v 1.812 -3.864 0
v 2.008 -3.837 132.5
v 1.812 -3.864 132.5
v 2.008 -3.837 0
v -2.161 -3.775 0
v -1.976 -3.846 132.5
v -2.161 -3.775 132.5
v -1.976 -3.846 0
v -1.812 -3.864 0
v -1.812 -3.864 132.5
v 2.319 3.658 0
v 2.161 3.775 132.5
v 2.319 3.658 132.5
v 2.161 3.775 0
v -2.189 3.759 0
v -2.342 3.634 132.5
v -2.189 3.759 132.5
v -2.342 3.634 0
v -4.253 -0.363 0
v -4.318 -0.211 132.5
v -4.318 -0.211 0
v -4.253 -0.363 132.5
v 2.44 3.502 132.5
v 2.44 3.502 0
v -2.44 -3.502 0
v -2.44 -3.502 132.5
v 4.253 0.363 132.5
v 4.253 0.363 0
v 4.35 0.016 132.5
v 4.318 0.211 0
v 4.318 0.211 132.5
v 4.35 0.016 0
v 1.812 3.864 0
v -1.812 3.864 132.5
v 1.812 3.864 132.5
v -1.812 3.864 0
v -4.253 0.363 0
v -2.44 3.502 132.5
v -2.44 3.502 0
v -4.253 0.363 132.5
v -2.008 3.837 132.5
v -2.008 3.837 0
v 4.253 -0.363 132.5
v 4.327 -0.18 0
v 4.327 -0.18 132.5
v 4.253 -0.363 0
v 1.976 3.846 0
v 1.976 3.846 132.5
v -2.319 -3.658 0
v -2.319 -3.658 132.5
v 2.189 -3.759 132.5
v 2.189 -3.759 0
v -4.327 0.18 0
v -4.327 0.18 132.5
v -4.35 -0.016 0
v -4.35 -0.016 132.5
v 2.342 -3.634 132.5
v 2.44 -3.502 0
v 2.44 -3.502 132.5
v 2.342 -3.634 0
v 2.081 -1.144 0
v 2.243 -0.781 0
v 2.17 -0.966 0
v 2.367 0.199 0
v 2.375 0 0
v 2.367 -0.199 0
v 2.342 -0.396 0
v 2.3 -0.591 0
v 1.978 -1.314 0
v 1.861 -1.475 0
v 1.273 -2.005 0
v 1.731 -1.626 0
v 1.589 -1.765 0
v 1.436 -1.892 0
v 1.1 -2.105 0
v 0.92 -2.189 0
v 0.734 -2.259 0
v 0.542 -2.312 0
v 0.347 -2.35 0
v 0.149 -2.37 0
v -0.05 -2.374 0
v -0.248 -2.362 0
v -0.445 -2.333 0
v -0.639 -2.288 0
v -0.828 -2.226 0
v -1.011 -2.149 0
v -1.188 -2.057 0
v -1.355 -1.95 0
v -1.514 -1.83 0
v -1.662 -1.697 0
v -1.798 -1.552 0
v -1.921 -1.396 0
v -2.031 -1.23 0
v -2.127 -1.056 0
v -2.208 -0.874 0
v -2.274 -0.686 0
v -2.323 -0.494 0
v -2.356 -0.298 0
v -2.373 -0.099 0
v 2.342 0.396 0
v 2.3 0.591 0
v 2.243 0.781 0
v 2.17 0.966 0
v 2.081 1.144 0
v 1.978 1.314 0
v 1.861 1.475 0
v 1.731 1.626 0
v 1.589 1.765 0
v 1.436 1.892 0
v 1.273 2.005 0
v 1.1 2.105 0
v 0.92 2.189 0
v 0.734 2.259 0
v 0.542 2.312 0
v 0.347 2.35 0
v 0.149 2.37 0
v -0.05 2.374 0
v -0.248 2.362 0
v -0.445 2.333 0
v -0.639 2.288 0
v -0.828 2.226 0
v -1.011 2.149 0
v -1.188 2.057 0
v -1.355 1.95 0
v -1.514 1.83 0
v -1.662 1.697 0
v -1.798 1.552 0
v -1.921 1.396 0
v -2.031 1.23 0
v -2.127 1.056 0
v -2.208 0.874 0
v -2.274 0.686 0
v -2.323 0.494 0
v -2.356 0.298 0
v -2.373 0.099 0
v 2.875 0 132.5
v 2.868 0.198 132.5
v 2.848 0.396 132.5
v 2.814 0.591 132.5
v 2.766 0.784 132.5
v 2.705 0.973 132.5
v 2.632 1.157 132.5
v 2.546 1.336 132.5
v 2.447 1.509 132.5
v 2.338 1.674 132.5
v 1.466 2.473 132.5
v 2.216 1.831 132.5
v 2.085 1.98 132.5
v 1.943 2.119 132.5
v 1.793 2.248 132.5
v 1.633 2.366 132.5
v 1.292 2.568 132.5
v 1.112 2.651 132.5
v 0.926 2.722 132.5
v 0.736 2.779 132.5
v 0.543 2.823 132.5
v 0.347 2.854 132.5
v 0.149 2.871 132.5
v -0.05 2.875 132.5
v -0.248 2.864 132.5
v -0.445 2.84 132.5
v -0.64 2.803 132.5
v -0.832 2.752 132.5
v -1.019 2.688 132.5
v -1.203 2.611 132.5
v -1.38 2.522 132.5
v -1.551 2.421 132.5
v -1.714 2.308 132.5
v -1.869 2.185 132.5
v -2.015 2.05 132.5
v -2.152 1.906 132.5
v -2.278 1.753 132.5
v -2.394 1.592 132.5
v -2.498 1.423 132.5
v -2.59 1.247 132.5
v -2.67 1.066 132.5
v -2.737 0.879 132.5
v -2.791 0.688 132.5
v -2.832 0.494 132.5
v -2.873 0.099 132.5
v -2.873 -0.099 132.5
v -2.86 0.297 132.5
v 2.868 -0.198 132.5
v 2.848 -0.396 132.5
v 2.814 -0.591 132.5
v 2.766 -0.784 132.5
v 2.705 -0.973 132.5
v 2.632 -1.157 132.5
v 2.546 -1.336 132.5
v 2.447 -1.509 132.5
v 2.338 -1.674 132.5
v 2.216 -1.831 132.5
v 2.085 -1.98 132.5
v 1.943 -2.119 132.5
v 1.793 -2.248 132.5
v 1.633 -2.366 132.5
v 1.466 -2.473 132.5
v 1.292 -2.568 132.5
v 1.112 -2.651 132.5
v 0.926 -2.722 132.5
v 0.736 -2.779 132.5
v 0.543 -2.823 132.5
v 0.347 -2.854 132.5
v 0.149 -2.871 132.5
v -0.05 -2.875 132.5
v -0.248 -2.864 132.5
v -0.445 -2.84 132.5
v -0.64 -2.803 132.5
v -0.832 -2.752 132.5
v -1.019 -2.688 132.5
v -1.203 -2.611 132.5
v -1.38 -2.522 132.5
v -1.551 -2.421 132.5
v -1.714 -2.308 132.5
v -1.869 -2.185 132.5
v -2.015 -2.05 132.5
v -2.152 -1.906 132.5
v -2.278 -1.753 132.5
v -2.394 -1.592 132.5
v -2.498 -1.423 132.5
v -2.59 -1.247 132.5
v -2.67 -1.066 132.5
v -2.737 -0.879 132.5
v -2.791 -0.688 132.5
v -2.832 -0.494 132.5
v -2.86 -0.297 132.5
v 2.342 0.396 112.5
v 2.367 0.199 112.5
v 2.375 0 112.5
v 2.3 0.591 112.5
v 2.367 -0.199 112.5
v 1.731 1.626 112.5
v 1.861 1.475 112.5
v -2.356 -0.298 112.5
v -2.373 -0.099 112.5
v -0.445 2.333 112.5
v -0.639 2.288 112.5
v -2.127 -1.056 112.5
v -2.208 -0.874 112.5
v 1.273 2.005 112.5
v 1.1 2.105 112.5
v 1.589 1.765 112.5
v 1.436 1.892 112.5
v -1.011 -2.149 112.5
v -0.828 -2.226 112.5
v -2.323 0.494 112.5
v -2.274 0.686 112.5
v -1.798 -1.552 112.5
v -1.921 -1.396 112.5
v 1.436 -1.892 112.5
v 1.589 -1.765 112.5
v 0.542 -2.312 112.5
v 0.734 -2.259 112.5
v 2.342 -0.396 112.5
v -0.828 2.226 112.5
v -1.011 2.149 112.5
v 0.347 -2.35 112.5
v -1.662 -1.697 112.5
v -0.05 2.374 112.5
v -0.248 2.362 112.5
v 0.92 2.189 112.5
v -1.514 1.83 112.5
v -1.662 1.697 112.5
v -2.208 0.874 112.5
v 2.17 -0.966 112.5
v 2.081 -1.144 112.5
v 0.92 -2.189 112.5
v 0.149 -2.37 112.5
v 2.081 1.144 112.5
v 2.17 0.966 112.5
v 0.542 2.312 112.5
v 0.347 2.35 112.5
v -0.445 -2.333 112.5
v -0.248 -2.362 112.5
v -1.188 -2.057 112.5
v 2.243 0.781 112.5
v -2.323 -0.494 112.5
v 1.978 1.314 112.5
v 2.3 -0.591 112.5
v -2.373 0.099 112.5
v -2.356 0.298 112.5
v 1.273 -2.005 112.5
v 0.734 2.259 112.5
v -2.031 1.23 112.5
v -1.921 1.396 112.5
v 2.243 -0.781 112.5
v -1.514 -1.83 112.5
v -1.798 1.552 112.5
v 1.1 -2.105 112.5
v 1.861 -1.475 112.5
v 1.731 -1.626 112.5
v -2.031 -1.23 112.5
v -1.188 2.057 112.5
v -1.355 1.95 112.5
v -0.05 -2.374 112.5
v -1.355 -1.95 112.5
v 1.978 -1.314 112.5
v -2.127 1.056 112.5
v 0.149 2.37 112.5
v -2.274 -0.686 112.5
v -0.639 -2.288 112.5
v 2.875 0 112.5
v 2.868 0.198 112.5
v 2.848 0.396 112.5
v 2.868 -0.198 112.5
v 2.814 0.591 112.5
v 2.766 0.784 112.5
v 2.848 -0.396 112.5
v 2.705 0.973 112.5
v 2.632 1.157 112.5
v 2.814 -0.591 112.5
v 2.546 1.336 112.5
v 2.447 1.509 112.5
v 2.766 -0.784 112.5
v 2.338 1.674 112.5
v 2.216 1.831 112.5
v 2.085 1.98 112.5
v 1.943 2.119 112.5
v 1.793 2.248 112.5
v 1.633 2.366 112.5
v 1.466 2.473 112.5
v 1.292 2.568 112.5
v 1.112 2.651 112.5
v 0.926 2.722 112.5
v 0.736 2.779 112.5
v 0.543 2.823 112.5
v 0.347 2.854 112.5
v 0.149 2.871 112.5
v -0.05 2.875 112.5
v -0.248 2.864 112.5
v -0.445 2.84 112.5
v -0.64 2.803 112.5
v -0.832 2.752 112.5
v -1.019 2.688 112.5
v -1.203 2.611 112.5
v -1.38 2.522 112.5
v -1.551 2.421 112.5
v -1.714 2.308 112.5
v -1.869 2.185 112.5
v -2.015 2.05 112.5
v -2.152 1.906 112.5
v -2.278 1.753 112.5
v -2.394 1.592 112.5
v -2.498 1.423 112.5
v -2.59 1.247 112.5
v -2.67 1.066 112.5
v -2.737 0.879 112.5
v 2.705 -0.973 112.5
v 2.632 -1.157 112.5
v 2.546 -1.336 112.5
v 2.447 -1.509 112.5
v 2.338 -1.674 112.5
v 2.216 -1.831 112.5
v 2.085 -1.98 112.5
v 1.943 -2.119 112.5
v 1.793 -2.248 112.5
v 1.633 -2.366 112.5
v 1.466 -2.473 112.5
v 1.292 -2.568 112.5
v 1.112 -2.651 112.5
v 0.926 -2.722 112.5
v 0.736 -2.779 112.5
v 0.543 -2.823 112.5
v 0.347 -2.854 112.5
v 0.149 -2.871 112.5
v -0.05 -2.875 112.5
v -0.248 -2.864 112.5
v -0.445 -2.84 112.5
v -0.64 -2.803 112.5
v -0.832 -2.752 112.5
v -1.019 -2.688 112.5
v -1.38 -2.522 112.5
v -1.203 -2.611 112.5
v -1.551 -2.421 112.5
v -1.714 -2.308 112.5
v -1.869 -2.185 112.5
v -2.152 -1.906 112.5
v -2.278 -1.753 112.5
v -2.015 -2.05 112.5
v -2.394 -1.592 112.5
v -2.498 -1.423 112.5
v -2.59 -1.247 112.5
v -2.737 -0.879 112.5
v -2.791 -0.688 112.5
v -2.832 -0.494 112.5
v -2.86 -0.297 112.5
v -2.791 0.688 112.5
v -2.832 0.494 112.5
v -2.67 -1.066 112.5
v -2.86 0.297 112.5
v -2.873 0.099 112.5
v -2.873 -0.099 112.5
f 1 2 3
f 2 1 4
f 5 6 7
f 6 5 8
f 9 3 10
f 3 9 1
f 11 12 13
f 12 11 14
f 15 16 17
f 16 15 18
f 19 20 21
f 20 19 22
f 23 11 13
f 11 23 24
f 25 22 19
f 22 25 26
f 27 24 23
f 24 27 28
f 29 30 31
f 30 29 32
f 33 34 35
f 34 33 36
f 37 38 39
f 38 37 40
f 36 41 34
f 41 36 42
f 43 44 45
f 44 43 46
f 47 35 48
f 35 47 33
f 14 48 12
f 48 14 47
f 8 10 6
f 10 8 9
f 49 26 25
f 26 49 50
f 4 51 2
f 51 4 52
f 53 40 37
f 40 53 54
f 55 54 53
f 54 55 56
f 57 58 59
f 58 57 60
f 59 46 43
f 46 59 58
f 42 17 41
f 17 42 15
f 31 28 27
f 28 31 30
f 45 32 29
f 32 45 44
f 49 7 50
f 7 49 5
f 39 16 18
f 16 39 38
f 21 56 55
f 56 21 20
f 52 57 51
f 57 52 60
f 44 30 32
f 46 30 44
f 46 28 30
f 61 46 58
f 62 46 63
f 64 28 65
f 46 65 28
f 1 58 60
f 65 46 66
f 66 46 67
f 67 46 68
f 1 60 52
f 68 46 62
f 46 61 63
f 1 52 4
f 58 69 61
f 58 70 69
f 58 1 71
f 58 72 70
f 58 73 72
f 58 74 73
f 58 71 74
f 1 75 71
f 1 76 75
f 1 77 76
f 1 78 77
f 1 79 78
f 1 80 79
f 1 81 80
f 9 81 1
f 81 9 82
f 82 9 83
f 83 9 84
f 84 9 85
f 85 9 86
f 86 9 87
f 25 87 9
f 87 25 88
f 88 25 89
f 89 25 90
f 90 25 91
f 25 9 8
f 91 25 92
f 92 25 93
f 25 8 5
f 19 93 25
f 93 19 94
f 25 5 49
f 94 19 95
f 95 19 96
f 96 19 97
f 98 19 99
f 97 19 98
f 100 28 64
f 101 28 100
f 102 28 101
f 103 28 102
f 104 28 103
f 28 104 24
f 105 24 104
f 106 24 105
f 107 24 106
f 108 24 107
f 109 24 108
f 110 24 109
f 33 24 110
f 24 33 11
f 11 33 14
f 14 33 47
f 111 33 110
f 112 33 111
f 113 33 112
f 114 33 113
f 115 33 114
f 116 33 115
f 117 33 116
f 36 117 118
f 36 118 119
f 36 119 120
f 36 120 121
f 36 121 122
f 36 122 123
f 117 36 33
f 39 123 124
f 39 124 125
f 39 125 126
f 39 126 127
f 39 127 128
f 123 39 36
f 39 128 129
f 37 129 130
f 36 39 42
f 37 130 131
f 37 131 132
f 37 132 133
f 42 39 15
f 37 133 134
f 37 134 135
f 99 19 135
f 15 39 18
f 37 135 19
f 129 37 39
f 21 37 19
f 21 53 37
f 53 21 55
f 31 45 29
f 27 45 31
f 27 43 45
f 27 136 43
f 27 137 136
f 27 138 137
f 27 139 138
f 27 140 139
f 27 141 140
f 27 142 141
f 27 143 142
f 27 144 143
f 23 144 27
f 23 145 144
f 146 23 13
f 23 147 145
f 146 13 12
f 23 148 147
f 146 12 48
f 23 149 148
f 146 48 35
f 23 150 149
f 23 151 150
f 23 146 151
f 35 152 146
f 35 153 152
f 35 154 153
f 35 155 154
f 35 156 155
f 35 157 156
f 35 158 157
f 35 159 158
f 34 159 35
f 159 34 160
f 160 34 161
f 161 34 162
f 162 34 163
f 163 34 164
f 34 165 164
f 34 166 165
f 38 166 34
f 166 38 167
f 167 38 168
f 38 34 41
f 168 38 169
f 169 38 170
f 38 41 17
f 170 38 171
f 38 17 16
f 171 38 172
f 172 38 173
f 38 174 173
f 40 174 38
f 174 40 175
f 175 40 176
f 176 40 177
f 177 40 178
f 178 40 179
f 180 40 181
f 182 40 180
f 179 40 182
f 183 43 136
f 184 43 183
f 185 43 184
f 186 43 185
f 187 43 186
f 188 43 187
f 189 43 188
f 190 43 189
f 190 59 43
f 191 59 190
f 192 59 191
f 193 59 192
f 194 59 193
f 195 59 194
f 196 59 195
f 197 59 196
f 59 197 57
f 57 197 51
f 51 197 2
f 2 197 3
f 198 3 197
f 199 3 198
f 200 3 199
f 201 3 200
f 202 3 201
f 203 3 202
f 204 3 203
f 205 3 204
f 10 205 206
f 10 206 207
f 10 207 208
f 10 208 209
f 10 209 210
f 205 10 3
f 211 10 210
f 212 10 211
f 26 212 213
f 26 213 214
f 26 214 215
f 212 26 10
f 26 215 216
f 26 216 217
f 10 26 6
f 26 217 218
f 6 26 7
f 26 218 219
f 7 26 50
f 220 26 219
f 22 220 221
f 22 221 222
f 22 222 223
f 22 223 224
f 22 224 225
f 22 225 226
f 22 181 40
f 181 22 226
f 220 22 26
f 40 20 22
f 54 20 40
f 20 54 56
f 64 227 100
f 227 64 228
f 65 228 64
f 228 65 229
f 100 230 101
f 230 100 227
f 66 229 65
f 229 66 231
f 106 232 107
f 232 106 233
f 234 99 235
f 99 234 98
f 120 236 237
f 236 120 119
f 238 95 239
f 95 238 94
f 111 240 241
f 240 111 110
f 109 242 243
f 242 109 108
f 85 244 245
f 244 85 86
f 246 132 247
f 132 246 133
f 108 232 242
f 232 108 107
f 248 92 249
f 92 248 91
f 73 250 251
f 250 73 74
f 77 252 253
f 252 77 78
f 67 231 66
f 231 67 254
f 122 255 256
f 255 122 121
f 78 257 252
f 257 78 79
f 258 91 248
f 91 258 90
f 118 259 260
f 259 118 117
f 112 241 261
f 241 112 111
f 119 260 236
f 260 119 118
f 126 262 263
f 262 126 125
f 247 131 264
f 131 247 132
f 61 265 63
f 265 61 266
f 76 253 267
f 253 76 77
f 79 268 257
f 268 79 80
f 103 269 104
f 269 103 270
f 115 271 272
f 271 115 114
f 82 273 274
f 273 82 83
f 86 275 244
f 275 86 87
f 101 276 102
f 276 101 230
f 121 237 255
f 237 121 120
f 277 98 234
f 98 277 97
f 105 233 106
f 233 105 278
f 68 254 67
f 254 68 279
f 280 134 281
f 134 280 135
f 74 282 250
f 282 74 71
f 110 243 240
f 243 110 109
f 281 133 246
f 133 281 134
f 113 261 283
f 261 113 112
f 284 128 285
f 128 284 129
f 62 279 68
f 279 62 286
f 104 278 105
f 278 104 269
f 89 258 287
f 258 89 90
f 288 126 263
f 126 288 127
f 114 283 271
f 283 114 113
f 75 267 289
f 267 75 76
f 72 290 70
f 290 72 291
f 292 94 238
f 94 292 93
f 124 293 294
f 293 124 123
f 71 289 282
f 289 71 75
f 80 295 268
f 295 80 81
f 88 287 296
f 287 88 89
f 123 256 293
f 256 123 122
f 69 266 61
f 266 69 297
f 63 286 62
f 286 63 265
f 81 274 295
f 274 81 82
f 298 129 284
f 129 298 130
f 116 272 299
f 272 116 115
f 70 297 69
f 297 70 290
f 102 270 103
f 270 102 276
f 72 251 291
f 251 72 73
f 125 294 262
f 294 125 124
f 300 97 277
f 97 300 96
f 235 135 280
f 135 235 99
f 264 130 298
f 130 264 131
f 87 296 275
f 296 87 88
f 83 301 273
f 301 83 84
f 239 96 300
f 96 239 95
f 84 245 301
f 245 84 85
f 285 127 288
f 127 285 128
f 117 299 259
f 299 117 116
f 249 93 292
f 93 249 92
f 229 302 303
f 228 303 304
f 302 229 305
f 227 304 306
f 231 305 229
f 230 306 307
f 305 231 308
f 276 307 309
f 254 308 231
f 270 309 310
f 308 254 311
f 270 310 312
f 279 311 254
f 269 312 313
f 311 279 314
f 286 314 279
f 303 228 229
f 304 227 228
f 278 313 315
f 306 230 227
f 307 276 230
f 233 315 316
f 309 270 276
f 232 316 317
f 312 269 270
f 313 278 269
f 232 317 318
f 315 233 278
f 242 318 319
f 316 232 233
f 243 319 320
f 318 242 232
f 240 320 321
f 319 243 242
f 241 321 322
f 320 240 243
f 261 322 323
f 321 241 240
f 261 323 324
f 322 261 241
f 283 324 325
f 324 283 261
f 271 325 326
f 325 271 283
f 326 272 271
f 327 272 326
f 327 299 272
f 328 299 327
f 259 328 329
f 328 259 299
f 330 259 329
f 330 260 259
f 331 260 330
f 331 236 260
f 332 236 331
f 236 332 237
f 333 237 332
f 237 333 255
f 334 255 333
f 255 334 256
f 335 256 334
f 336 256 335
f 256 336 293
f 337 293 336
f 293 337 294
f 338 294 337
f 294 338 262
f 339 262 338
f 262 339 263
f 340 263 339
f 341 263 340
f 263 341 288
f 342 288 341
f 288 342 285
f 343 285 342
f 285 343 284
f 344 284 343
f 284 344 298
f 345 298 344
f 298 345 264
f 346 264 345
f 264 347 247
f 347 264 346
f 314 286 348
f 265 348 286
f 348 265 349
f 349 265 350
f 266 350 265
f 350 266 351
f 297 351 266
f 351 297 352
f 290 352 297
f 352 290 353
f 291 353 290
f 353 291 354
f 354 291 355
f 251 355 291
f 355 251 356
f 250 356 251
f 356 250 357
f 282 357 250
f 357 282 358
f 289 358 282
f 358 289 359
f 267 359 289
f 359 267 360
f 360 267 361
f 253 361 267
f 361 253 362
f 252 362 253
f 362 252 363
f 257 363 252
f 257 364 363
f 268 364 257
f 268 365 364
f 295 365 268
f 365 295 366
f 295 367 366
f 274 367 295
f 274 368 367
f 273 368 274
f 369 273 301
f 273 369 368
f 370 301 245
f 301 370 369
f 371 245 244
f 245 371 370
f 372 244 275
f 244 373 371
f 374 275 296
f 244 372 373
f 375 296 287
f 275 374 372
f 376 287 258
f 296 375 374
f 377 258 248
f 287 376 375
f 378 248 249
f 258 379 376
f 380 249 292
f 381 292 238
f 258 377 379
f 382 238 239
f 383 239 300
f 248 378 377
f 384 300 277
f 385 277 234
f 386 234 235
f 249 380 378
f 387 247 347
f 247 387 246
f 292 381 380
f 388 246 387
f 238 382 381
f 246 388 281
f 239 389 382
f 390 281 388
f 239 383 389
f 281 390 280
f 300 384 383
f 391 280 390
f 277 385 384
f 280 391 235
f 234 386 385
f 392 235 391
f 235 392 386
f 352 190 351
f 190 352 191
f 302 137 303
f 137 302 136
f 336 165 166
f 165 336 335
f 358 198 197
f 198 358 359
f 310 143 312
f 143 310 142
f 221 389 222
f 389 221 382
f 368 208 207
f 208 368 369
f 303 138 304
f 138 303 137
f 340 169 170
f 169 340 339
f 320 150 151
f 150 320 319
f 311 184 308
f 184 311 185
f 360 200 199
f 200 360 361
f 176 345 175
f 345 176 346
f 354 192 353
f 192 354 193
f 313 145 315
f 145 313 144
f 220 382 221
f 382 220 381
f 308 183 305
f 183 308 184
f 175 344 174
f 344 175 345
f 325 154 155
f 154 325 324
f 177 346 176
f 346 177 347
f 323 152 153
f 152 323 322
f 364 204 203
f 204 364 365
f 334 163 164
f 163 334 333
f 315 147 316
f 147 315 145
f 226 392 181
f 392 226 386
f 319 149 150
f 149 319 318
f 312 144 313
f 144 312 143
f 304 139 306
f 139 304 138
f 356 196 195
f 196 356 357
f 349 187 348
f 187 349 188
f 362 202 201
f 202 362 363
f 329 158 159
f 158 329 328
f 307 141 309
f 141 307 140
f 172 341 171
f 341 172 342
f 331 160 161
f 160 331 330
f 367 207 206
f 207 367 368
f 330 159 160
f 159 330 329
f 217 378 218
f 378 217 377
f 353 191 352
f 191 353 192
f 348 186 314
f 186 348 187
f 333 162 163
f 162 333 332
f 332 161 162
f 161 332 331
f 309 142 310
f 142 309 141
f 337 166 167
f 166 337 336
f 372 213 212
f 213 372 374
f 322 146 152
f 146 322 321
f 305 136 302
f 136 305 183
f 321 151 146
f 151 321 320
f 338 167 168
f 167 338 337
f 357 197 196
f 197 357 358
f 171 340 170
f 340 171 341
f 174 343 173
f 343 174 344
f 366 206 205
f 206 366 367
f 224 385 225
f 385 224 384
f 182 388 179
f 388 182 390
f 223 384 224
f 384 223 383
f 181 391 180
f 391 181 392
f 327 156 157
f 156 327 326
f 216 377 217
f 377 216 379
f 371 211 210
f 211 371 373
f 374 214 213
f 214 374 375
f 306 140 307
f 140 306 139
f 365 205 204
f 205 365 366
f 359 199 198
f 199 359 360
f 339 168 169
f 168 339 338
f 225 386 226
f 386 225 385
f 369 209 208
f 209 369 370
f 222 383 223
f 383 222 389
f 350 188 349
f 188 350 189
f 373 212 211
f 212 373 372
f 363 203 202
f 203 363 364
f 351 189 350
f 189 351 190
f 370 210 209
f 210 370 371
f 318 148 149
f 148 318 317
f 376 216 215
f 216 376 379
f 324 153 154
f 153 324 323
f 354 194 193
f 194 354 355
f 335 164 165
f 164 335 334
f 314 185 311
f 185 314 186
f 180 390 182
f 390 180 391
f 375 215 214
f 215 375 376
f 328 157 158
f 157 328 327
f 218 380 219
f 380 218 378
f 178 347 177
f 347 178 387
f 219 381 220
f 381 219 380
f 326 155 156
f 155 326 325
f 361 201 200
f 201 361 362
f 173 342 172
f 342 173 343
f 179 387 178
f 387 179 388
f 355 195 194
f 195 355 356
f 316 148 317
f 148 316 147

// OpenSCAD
/*
kitaboshi.scad generates barrel for the Kita-Boshi 2mm mechanical pencil

GNU General Public License v3.0
Permissions of this strong copyleft license are conditioned on making available complete source
code of licensed works and modifications, which include larger works using a licensed work, under
the same license. Copyright and license notices must be preserved. Contributors provide an express
grant of patent rights.
*/

// Pen shape
cylindric = false;
// Pen grip
grip = false;

// Printer tolerance
printer_tolerance = 0.25;

/* [Hidden] */
// Default barrel dimensions
barrel_length = 132.5;
barrel_diameter = 8.7;
lead_chamber_diameter = 4.5;
thread_diameter = 5.5;
thread_length = 20.0;

// Resolution
$fa=2; // default minimum facet angle
$fs=0.2; // default minimum facet size

module kitaboshi( cy = cylindric,
                  gr = grip,
                  pt = printer_tolerance ) {

     // Barrel
     module barrel() {
          sides = cy ? 180 : 6;
          difference() {

               // External shape
               linear_extrude(height = barrel_length, center = false, convexity = 10, twist = 0)
                    offset(r = (barrel_diameter/sides)/2)
                    circle(d = barrel_diameter-(barrel_diameter/sides), $fn = sides);

               // Lead hole
               cylinder(h = barrel_length-thread_length, d = lead_chamber_diameter+pt);

               // Thread hole
               translate([0, 0, barrel_length-thread_length])
                    cylinder(h = thread_length, d = thread_diameter+pt);
          }
     }

     // Grip substractive pattern
     module grip() {
          translate([0, 0, 2*barrel_length/3])
               for (i = [0 : barrel_diameter-barrel_diameter*sqrt(3)/2 : barrel_length/4])
                    translate([0, 0, i])
                         rotate_extrude(angle = 360, convexity = 2)
                         translate([barrel_diameter/2, 0, 0])
                         rotate([0, 0, 30])
                         circle(d = (barrel_diameter/2)-barrel_diameter*sqrt(3)/4, $fn = 6);
     }

     // Main
     difference() {
          color("Goldenrod", 1) barrel();
          if (gr) {
               color("YellowGreen", 1) grip();
          }
     }
}

// Customizer instantiation
kitaboshi();
